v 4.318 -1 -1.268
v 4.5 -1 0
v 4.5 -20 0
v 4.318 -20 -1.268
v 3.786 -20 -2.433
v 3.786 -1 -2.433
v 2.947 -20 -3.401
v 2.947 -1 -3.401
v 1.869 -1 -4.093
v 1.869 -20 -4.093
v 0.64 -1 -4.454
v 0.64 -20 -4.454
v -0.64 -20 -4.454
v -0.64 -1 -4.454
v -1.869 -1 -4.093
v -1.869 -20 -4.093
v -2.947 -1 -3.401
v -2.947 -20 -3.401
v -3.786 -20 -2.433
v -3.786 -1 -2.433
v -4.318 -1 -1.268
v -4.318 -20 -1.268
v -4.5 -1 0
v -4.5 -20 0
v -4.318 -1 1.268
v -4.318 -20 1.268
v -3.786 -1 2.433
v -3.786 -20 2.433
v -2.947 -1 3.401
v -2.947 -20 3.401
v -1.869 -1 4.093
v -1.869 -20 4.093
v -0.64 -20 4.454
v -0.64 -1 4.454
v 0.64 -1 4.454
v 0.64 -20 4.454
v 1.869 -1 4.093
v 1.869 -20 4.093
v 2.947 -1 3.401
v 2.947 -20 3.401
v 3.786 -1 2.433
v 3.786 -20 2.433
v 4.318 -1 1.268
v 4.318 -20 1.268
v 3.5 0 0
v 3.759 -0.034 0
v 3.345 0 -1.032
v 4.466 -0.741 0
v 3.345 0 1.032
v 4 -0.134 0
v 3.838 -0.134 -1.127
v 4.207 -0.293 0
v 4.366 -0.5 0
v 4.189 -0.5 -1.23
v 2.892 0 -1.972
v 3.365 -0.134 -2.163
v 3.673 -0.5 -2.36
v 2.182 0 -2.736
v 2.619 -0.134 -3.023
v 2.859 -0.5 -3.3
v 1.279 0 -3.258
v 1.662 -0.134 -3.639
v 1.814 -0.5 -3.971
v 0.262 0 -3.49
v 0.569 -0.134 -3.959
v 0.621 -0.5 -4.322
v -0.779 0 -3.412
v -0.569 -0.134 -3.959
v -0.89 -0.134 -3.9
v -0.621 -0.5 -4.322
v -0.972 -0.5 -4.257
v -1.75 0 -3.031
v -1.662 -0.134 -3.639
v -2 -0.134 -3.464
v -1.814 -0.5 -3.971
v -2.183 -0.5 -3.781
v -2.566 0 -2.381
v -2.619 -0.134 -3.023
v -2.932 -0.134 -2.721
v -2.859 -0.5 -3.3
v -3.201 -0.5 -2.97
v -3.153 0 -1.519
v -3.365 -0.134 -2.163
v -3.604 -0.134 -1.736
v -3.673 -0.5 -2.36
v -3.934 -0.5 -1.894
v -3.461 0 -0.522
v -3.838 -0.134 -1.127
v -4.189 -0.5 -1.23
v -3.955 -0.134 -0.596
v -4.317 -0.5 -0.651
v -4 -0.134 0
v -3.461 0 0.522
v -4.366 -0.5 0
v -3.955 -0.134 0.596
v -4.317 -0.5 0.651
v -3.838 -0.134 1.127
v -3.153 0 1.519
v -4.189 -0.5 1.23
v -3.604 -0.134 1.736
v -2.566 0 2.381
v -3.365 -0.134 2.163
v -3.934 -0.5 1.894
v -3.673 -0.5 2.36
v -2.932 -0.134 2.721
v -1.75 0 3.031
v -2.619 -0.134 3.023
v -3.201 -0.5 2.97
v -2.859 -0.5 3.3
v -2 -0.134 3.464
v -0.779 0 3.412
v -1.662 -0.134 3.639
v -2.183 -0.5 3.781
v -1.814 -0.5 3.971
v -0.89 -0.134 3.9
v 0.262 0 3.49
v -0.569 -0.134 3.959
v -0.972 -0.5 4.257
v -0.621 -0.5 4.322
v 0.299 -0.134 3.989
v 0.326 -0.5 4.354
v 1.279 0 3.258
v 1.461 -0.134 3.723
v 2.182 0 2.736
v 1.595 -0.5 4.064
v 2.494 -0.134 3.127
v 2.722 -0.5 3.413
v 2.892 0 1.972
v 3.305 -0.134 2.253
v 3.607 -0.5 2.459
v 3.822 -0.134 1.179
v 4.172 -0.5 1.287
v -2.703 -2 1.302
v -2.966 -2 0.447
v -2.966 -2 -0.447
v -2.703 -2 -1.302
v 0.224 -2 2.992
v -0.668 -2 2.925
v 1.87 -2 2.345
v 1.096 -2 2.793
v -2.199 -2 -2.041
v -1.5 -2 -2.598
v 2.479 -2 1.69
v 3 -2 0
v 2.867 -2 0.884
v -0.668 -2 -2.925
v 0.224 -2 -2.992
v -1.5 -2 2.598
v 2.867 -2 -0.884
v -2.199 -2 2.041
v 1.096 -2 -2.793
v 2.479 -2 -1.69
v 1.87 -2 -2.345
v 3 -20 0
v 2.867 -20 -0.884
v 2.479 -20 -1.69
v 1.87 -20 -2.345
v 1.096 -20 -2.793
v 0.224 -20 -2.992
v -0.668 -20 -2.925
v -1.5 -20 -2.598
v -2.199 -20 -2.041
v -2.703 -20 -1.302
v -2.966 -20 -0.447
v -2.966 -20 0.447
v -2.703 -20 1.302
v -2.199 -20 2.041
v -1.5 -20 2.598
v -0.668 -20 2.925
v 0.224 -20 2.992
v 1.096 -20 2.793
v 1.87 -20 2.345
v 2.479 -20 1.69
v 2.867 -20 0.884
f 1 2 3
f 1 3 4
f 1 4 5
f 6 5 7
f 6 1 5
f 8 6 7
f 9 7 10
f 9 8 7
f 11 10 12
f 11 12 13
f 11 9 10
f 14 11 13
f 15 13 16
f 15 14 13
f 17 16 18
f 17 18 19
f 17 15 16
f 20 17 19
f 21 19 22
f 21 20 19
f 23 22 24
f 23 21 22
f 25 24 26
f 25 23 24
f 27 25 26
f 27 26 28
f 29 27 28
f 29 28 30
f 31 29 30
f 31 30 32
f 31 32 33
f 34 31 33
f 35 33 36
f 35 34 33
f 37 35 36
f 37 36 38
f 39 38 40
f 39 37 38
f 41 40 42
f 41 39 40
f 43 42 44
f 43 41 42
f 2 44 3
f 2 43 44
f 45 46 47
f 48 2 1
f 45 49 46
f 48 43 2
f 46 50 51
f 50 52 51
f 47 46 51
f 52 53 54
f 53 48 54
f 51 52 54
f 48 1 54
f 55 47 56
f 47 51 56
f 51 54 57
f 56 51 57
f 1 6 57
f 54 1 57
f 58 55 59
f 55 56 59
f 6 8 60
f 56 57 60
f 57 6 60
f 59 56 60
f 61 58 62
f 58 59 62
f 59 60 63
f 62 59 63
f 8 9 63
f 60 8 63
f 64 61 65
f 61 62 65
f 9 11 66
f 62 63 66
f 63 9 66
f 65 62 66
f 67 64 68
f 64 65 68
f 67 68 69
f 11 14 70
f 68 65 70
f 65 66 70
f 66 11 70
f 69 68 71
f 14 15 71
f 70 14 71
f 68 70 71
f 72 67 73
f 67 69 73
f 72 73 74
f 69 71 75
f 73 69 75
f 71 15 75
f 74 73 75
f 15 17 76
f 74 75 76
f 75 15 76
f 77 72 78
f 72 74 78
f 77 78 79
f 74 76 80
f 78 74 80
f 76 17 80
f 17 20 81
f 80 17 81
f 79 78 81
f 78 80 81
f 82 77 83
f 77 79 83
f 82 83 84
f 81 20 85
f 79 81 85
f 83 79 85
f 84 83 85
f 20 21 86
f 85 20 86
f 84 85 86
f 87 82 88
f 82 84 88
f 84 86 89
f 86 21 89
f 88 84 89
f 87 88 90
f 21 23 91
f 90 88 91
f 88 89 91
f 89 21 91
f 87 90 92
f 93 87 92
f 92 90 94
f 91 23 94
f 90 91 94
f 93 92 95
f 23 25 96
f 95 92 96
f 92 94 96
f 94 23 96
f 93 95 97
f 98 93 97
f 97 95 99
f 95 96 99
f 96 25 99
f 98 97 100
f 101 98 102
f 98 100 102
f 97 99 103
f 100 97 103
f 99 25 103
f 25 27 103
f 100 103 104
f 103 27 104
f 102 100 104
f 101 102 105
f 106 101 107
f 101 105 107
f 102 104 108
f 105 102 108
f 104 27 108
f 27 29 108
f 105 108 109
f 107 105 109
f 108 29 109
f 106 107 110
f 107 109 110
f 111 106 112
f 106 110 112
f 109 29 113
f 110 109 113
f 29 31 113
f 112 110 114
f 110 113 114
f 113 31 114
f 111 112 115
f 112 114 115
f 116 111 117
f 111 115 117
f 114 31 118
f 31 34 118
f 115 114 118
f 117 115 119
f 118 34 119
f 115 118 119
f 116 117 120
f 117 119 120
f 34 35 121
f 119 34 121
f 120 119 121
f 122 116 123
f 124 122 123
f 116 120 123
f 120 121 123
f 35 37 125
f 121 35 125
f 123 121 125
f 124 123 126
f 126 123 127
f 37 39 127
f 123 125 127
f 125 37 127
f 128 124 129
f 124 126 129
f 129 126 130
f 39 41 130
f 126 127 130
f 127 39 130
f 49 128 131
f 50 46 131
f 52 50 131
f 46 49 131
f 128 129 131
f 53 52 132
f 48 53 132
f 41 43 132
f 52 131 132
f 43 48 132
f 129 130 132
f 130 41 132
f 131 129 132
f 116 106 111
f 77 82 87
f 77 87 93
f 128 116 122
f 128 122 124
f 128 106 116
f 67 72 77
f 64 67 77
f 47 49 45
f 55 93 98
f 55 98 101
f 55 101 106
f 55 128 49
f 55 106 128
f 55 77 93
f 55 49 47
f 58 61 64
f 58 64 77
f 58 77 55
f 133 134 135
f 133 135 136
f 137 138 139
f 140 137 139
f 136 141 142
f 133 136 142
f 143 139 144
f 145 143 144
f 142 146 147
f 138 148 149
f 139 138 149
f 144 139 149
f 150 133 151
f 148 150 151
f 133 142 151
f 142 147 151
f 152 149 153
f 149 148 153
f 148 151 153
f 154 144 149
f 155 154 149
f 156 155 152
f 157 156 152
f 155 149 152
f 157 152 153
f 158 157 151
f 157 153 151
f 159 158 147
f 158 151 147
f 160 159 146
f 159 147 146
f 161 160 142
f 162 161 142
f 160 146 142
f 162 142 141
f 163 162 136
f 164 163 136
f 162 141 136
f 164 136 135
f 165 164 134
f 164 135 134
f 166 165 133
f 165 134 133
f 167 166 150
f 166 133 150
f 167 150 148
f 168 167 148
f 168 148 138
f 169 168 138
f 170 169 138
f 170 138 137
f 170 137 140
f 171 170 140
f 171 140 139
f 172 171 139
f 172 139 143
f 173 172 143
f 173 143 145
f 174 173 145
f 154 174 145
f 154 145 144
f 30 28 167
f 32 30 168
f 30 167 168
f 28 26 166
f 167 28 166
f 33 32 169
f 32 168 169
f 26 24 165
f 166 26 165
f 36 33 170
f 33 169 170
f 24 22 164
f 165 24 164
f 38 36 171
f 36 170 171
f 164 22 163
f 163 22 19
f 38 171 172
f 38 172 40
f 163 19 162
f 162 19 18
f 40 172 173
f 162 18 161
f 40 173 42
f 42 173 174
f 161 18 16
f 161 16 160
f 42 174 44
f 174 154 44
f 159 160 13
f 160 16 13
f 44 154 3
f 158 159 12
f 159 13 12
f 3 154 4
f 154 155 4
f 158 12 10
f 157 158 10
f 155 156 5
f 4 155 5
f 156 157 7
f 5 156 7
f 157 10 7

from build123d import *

# Parameters (mm, degrees)
SKETCH2_R           = 4.5
SKETCH2_R_2         = 3
BOSS_EXTRUDE1_DEPTH = 20
SKETCH2_2_R         = 3
BOSS_EXTRUDE2_DEPTH = 2
FILLET1_R           = 1


with BuildPart() as part:
    # Sketch2 → Boss-Extrude1 (new body)
    with BuildSketch(Plane(origin=(0, 0, 0), x_dir=(1, 0, 0), z_dir=(0, 1, 0))):
        Circle(SKETCH2_R)
        Circle(SKETCH2_R_2, mode=Mode.SUBTRACT)
    extrude(amount=-BOSS_EXTRUDE1_DEPTH)

    # Sketch2<2> → Boss-Extrude2 (add)
    with BuildSketch(Plane(origin=(0, 0, 0), x_dir=(1, 0, 0), z_dir=(0, 1, 0))):
        Circle(SKETCH2_2_R)
    extrude(amount=-BOSS_EXTRUDE2_DEPTH)

    # Fillet1
    fillet1_edges = [part.edges().sort_by_distance(p)[0] for p in [
        (-4.5, 0, 0),
    ]]
    fillet(fillet1_edges, radius=FILLET1_R)


solid = part.part
